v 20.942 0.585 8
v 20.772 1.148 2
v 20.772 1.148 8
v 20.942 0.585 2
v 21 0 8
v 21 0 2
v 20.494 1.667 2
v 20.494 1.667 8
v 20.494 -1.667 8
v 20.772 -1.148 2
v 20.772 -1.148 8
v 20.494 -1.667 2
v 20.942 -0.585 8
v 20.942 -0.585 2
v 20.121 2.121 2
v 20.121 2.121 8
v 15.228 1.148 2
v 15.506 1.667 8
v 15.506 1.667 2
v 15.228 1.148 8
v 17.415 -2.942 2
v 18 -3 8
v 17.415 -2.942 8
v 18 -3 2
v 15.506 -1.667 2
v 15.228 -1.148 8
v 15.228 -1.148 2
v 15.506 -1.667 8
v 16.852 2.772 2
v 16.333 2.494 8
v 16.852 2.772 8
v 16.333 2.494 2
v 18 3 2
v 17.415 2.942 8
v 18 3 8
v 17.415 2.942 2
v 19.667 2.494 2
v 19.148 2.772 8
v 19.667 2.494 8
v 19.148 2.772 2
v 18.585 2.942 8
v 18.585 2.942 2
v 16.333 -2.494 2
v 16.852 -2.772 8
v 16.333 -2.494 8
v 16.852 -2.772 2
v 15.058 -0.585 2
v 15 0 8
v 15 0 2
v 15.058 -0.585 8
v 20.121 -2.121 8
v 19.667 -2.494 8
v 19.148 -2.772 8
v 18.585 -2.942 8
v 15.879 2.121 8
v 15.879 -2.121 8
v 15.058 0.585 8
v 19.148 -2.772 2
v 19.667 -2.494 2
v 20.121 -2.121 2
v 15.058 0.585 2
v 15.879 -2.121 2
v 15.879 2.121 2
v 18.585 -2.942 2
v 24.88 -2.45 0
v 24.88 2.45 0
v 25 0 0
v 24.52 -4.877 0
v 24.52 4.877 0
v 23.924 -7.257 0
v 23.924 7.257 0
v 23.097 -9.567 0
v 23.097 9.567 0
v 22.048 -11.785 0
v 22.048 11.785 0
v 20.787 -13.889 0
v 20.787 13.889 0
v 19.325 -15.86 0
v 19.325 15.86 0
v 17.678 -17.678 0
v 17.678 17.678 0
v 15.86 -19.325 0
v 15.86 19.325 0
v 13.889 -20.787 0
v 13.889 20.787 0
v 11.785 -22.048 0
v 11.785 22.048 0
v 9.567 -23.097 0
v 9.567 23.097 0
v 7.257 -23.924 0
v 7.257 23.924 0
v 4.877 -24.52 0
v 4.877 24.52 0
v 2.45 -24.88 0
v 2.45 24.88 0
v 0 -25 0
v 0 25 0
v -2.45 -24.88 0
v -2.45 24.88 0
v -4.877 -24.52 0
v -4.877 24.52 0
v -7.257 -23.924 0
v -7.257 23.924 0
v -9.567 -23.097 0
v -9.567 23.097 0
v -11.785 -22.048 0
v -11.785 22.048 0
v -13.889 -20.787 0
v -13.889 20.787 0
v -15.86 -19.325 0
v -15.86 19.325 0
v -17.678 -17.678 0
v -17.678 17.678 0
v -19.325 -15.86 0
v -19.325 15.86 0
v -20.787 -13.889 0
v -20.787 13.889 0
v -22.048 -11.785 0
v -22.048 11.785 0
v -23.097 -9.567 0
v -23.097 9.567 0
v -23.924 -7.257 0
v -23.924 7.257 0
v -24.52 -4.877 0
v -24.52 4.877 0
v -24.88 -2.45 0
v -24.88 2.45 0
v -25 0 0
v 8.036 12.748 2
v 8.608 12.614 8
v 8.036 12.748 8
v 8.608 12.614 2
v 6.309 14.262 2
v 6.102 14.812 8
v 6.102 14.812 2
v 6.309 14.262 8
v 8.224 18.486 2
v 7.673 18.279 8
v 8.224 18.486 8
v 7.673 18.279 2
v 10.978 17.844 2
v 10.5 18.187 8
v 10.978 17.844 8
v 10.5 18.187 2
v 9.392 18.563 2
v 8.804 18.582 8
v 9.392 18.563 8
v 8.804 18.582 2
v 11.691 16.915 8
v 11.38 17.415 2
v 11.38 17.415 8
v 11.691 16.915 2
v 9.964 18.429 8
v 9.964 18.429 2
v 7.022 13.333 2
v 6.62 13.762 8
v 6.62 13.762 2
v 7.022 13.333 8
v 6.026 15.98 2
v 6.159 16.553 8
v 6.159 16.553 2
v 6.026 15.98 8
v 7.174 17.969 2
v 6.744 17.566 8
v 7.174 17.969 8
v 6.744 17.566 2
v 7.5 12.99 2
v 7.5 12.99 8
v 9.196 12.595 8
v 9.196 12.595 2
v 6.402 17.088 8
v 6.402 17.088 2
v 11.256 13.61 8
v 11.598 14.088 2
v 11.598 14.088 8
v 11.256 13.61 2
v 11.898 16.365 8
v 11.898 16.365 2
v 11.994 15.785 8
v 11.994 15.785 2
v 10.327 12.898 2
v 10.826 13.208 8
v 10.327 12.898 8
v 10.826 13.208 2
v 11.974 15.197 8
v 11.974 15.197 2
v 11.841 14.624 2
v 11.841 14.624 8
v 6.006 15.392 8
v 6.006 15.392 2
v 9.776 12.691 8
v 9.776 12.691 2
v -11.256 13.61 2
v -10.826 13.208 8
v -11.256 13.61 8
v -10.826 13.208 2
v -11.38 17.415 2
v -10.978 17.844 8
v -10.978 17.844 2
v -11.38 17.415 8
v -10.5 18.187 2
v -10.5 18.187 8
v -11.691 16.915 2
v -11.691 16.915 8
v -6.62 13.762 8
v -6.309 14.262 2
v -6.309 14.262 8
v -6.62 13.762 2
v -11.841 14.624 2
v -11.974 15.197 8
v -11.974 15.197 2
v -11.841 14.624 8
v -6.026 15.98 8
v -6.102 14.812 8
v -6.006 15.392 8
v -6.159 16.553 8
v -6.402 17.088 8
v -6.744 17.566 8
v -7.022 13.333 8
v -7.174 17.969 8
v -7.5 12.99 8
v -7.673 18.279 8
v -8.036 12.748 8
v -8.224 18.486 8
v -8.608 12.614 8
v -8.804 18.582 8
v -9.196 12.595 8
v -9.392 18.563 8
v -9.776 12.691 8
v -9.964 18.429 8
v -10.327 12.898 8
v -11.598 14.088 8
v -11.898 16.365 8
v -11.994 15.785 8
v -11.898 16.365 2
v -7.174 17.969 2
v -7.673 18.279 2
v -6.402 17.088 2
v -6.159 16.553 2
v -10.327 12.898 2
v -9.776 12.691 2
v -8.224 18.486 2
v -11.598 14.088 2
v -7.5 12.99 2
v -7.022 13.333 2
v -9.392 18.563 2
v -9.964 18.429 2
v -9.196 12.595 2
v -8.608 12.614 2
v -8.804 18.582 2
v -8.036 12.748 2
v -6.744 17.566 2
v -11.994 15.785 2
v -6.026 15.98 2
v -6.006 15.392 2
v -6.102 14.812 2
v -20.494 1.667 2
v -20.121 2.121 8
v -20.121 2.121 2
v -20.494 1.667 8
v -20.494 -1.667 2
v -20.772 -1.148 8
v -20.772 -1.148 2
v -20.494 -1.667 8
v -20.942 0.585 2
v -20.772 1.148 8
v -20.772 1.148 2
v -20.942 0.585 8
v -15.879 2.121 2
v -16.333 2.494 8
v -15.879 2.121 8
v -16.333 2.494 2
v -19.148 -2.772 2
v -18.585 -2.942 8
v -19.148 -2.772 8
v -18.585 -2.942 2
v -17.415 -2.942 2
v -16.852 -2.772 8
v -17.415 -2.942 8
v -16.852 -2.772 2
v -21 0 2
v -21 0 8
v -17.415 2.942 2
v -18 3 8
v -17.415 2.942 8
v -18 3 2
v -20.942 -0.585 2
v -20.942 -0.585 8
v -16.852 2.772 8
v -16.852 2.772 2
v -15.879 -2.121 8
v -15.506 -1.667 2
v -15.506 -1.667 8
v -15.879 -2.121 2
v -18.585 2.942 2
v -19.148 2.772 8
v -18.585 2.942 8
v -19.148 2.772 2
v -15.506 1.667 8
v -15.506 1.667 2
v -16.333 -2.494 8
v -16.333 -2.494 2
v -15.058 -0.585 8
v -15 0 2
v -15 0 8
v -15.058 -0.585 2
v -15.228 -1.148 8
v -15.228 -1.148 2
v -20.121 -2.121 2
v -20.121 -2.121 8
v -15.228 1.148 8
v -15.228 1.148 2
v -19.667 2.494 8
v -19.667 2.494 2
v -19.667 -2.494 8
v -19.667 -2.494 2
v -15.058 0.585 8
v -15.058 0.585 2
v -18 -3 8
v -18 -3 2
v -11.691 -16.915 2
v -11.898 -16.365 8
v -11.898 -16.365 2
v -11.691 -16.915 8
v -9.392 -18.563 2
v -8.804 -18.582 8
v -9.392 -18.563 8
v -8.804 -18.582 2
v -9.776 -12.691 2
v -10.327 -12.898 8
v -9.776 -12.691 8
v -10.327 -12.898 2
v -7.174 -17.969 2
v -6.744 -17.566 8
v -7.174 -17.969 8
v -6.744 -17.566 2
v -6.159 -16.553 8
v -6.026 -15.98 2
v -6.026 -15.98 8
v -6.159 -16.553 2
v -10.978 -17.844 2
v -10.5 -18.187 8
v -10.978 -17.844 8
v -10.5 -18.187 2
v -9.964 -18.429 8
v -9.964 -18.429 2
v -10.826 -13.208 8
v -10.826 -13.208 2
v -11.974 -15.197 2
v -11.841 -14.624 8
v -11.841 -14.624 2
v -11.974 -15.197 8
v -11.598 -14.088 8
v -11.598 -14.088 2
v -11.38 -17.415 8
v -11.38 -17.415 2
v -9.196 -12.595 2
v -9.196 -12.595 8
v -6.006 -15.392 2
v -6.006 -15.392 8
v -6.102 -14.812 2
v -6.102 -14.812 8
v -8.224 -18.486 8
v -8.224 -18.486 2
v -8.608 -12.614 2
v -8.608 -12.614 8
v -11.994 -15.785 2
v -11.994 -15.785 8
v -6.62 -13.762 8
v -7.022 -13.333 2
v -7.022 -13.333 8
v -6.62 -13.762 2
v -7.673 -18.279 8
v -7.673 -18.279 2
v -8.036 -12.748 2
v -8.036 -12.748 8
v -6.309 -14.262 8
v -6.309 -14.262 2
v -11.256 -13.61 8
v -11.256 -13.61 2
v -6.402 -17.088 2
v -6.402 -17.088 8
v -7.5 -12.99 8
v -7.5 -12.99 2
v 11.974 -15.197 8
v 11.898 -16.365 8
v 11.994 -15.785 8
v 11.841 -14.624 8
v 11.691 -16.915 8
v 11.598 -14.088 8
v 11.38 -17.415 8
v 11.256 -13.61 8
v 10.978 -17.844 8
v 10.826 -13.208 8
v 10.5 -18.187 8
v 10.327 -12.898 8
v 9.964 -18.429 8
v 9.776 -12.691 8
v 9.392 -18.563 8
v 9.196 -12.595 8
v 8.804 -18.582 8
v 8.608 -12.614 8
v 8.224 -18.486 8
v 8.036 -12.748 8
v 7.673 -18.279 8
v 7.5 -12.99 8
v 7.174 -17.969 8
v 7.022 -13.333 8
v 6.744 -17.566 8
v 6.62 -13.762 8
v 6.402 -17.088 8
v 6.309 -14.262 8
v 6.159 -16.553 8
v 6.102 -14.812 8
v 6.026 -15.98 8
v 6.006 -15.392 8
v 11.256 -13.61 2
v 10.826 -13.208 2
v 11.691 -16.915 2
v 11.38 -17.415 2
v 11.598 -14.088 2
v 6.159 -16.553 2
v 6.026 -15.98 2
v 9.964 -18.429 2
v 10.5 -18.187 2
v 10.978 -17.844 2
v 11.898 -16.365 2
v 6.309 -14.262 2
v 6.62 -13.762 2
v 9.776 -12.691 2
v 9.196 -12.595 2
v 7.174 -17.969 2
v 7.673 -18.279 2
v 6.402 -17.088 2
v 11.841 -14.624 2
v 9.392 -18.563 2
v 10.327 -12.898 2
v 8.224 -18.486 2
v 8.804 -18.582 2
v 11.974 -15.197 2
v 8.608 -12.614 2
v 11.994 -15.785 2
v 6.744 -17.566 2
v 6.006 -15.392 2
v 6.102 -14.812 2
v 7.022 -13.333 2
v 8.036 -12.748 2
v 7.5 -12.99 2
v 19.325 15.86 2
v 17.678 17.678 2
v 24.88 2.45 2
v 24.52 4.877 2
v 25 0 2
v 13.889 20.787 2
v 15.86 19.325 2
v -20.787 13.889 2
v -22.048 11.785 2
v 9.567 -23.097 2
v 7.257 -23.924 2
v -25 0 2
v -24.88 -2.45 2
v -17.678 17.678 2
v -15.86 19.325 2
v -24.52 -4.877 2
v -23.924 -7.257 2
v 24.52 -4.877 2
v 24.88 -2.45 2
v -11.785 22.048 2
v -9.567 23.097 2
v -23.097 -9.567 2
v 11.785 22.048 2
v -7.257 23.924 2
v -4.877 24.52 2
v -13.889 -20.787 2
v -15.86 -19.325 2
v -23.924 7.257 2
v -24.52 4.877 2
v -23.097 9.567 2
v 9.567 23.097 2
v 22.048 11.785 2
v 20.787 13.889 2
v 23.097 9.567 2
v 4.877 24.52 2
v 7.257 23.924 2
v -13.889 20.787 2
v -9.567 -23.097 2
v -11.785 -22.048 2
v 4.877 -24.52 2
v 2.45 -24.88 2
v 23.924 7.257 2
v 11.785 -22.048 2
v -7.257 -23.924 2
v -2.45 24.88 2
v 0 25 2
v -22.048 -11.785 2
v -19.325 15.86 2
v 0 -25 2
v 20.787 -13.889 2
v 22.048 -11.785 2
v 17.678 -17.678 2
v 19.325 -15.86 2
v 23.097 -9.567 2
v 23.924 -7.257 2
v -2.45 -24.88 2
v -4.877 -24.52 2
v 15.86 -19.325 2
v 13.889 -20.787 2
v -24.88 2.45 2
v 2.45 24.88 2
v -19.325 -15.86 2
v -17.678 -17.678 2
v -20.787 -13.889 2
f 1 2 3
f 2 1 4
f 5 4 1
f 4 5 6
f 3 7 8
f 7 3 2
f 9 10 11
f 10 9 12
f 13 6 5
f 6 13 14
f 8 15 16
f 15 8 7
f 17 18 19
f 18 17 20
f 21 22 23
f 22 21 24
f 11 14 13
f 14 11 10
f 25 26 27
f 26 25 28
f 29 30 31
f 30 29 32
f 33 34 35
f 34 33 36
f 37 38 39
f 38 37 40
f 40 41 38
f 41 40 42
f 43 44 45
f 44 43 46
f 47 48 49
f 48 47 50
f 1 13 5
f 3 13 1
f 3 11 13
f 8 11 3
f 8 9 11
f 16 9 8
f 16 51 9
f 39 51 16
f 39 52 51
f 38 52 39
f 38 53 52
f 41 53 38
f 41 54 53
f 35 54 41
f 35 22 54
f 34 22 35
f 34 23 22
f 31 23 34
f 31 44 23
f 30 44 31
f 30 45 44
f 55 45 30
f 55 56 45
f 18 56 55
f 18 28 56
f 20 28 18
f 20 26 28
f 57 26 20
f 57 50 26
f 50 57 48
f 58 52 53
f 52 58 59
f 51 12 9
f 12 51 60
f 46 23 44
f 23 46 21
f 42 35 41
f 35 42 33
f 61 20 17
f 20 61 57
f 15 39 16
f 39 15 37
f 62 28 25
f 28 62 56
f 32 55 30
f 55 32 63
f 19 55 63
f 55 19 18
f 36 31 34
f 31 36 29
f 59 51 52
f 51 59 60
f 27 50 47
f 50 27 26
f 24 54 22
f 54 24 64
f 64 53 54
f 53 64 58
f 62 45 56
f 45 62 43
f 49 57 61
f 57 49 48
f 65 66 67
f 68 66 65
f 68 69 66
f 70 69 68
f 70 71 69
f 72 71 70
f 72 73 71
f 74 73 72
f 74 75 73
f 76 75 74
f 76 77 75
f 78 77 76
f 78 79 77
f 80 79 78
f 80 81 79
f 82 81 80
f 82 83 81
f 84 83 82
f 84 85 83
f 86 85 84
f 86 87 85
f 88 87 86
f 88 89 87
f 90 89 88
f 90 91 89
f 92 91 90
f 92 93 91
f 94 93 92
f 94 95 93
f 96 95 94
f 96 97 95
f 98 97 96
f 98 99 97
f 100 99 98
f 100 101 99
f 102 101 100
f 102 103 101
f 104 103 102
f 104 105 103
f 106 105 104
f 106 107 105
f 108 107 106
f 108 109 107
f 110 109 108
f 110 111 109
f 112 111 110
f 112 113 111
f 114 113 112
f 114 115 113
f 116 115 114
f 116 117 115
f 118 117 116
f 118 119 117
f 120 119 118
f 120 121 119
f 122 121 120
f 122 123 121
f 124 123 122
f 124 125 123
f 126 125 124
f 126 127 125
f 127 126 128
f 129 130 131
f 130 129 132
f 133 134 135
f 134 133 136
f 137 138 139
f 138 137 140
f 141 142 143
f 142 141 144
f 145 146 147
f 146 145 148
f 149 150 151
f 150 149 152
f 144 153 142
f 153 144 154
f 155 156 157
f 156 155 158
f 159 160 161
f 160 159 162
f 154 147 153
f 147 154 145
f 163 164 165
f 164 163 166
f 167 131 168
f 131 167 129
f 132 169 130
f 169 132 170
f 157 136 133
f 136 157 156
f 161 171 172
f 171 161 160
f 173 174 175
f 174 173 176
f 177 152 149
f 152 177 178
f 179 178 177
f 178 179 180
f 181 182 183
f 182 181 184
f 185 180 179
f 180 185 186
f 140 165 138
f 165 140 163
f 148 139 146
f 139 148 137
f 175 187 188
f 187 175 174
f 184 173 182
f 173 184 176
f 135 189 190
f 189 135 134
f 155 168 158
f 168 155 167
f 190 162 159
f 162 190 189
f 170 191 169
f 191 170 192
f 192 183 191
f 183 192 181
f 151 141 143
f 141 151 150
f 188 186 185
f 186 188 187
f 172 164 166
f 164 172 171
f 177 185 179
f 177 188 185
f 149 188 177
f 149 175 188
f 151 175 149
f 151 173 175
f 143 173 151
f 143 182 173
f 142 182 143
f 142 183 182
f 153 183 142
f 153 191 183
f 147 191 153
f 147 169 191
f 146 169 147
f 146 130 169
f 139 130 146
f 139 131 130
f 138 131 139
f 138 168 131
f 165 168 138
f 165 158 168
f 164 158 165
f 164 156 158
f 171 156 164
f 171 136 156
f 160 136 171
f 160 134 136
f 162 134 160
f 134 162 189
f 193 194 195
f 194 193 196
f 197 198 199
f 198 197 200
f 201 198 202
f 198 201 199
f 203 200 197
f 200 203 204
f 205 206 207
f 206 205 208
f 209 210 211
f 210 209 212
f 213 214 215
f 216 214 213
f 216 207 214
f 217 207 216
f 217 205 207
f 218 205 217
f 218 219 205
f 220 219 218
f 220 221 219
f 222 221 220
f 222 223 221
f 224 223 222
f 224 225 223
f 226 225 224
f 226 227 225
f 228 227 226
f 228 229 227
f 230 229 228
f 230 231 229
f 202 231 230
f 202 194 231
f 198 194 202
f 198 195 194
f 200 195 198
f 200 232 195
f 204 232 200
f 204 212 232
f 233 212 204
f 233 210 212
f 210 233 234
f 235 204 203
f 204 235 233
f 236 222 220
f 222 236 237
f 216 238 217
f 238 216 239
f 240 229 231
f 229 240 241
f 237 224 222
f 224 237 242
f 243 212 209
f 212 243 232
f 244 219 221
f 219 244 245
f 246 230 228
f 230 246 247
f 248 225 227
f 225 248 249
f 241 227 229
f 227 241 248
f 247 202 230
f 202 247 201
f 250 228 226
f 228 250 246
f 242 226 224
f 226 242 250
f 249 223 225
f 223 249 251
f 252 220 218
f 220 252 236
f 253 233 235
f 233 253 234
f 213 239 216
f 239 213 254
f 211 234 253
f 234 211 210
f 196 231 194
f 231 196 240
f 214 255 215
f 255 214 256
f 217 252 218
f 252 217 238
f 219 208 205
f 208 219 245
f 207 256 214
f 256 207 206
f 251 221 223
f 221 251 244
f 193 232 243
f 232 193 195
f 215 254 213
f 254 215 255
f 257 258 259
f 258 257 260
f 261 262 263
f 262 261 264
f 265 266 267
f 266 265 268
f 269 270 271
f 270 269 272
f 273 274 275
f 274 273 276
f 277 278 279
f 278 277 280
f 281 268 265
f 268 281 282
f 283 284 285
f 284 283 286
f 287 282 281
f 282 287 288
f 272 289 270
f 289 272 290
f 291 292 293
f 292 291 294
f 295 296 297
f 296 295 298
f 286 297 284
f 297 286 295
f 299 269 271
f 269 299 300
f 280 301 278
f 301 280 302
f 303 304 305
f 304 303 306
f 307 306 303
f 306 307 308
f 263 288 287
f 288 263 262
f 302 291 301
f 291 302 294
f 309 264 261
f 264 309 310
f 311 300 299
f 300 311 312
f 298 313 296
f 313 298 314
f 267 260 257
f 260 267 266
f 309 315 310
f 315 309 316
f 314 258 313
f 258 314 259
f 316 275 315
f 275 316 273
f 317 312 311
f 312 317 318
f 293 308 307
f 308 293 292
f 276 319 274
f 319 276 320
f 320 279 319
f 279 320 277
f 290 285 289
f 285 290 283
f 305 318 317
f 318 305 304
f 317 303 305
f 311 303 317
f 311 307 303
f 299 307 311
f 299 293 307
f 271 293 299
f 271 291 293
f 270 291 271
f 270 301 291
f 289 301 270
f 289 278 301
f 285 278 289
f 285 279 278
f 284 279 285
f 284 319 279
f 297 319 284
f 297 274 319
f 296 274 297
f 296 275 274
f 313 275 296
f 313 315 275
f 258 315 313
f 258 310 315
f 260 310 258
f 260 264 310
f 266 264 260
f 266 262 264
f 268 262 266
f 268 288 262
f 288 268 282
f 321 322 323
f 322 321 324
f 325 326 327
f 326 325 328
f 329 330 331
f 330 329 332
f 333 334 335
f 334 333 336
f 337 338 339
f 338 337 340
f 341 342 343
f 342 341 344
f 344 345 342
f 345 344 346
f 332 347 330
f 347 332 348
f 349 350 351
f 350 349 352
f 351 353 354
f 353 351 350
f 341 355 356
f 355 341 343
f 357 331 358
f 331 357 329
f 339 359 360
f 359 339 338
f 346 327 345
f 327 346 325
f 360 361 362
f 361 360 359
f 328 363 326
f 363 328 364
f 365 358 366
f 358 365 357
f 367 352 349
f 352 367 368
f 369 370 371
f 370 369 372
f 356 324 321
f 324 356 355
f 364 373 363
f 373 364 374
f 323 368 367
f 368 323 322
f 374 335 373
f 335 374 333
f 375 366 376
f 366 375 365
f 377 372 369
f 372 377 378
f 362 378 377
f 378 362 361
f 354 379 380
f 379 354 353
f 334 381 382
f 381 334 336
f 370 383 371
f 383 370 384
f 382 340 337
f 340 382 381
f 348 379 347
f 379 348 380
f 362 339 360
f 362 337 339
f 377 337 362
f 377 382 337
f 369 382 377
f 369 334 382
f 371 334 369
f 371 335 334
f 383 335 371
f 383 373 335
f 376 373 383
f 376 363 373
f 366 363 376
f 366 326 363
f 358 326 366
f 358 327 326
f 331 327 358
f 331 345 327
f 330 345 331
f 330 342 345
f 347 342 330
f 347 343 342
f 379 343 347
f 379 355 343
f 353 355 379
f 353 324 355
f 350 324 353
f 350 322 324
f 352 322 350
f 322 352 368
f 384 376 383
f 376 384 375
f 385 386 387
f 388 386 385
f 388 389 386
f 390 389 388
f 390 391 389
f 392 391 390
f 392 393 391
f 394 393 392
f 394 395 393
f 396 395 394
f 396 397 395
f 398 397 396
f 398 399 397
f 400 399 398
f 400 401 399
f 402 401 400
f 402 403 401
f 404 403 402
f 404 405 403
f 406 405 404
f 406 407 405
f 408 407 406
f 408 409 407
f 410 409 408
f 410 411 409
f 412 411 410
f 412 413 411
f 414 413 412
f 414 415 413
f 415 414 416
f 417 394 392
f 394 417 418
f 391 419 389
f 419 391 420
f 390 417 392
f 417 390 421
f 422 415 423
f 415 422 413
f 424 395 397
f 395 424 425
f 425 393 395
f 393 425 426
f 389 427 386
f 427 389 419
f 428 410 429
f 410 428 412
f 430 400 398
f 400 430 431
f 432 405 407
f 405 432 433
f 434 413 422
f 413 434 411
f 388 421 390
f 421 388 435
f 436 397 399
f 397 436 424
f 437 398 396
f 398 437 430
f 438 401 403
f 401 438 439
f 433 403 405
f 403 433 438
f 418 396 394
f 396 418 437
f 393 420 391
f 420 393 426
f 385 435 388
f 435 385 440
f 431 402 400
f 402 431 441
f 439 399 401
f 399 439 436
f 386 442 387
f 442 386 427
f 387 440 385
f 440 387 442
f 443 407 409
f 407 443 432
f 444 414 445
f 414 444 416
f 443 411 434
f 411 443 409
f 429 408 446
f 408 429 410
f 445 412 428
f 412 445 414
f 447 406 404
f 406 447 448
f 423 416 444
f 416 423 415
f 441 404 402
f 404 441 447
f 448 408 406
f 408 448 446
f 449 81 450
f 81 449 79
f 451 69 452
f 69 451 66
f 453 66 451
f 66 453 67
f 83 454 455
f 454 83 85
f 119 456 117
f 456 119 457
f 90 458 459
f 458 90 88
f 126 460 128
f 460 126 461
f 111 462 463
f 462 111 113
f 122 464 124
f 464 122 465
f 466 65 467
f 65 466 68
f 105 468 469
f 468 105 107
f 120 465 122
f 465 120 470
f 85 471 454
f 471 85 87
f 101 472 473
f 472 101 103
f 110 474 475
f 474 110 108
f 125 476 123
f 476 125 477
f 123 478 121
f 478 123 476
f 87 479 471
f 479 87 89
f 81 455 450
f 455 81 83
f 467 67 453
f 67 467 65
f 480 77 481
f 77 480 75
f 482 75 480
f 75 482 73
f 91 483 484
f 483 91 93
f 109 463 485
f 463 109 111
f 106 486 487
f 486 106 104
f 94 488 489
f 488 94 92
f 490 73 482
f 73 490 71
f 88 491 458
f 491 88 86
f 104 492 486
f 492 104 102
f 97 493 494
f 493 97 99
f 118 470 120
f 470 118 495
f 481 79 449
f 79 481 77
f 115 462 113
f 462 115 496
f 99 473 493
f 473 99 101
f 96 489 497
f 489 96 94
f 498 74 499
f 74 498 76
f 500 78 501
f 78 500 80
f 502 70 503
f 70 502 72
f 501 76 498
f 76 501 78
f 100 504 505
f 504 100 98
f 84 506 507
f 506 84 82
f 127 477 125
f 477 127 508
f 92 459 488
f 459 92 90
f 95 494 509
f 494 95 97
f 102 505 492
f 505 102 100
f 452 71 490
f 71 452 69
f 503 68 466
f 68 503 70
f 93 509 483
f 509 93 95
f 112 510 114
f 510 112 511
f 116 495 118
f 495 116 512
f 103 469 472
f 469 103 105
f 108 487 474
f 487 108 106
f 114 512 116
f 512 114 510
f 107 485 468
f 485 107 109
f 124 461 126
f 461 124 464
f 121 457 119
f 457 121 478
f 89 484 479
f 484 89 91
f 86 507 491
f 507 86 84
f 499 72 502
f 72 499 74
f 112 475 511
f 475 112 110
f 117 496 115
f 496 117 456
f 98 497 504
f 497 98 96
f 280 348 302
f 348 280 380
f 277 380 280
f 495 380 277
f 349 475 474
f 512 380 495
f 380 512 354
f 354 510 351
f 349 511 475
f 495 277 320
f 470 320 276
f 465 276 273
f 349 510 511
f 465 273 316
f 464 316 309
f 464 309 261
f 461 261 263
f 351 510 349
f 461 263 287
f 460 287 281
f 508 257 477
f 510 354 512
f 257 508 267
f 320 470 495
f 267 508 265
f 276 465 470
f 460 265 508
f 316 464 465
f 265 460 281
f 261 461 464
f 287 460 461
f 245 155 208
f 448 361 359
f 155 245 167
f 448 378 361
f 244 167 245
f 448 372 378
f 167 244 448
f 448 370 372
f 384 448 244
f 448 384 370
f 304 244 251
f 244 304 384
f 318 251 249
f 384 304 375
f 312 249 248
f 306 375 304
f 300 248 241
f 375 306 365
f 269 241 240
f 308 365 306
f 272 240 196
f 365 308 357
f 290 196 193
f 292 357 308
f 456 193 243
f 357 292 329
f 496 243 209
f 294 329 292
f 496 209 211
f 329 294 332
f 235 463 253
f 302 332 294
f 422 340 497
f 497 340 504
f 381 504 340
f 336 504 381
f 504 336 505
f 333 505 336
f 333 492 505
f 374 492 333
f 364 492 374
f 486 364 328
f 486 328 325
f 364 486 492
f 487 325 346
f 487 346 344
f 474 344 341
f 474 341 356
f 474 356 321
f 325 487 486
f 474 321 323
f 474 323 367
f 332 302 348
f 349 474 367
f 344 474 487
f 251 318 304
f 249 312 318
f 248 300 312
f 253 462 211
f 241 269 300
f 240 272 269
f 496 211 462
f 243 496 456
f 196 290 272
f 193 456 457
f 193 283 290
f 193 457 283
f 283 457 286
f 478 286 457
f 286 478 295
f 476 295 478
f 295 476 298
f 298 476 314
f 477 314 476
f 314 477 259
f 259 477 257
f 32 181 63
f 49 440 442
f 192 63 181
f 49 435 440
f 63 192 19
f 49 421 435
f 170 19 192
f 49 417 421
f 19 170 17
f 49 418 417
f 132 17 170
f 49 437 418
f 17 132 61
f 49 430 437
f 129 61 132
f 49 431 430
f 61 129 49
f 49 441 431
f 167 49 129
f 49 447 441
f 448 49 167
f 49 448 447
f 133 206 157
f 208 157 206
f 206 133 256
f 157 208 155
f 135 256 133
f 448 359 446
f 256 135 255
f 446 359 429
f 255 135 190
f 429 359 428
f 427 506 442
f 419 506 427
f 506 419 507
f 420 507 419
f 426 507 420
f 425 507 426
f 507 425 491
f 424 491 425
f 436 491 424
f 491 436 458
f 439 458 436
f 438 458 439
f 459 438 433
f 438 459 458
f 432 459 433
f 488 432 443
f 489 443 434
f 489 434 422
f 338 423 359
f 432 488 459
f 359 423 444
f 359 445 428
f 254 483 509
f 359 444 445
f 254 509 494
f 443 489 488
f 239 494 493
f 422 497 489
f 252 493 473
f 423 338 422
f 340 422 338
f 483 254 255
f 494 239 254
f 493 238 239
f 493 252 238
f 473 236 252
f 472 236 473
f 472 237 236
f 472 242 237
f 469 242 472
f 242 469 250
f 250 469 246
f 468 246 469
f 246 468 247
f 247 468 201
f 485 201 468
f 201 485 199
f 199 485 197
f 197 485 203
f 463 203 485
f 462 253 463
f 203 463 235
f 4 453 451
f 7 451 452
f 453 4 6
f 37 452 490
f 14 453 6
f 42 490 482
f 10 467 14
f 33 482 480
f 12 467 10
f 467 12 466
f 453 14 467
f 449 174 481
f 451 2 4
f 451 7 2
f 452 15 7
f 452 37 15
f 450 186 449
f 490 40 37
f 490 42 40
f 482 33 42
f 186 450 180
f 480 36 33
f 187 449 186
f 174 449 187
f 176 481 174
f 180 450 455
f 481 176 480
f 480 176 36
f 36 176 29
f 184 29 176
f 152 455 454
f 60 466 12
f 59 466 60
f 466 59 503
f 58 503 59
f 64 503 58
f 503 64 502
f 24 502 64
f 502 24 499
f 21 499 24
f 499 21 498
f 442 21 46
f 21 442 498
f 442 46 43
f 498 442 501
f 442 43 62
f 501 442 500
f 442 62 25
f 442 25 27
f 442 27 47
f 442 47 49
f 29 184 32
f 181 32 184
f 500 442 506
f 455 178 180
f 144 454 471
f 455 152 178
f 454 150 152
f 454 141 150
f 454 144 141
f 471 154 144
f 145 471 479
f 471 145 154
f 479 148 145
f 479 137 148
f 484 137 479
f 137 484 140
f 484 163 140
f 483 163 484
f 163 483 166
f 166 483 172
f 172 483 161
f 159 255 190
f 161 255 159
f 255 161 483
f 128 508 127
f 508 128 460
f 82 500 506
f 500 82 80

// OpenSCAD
use <../nscad-lib.scad>

color("lightgray") cylinder(r = 25, h = 2, $fn = 64);
color("orange") rotateMultiply(x = 18, count = 6) cylinder(d = 6, h = 8, $fn = 32);
